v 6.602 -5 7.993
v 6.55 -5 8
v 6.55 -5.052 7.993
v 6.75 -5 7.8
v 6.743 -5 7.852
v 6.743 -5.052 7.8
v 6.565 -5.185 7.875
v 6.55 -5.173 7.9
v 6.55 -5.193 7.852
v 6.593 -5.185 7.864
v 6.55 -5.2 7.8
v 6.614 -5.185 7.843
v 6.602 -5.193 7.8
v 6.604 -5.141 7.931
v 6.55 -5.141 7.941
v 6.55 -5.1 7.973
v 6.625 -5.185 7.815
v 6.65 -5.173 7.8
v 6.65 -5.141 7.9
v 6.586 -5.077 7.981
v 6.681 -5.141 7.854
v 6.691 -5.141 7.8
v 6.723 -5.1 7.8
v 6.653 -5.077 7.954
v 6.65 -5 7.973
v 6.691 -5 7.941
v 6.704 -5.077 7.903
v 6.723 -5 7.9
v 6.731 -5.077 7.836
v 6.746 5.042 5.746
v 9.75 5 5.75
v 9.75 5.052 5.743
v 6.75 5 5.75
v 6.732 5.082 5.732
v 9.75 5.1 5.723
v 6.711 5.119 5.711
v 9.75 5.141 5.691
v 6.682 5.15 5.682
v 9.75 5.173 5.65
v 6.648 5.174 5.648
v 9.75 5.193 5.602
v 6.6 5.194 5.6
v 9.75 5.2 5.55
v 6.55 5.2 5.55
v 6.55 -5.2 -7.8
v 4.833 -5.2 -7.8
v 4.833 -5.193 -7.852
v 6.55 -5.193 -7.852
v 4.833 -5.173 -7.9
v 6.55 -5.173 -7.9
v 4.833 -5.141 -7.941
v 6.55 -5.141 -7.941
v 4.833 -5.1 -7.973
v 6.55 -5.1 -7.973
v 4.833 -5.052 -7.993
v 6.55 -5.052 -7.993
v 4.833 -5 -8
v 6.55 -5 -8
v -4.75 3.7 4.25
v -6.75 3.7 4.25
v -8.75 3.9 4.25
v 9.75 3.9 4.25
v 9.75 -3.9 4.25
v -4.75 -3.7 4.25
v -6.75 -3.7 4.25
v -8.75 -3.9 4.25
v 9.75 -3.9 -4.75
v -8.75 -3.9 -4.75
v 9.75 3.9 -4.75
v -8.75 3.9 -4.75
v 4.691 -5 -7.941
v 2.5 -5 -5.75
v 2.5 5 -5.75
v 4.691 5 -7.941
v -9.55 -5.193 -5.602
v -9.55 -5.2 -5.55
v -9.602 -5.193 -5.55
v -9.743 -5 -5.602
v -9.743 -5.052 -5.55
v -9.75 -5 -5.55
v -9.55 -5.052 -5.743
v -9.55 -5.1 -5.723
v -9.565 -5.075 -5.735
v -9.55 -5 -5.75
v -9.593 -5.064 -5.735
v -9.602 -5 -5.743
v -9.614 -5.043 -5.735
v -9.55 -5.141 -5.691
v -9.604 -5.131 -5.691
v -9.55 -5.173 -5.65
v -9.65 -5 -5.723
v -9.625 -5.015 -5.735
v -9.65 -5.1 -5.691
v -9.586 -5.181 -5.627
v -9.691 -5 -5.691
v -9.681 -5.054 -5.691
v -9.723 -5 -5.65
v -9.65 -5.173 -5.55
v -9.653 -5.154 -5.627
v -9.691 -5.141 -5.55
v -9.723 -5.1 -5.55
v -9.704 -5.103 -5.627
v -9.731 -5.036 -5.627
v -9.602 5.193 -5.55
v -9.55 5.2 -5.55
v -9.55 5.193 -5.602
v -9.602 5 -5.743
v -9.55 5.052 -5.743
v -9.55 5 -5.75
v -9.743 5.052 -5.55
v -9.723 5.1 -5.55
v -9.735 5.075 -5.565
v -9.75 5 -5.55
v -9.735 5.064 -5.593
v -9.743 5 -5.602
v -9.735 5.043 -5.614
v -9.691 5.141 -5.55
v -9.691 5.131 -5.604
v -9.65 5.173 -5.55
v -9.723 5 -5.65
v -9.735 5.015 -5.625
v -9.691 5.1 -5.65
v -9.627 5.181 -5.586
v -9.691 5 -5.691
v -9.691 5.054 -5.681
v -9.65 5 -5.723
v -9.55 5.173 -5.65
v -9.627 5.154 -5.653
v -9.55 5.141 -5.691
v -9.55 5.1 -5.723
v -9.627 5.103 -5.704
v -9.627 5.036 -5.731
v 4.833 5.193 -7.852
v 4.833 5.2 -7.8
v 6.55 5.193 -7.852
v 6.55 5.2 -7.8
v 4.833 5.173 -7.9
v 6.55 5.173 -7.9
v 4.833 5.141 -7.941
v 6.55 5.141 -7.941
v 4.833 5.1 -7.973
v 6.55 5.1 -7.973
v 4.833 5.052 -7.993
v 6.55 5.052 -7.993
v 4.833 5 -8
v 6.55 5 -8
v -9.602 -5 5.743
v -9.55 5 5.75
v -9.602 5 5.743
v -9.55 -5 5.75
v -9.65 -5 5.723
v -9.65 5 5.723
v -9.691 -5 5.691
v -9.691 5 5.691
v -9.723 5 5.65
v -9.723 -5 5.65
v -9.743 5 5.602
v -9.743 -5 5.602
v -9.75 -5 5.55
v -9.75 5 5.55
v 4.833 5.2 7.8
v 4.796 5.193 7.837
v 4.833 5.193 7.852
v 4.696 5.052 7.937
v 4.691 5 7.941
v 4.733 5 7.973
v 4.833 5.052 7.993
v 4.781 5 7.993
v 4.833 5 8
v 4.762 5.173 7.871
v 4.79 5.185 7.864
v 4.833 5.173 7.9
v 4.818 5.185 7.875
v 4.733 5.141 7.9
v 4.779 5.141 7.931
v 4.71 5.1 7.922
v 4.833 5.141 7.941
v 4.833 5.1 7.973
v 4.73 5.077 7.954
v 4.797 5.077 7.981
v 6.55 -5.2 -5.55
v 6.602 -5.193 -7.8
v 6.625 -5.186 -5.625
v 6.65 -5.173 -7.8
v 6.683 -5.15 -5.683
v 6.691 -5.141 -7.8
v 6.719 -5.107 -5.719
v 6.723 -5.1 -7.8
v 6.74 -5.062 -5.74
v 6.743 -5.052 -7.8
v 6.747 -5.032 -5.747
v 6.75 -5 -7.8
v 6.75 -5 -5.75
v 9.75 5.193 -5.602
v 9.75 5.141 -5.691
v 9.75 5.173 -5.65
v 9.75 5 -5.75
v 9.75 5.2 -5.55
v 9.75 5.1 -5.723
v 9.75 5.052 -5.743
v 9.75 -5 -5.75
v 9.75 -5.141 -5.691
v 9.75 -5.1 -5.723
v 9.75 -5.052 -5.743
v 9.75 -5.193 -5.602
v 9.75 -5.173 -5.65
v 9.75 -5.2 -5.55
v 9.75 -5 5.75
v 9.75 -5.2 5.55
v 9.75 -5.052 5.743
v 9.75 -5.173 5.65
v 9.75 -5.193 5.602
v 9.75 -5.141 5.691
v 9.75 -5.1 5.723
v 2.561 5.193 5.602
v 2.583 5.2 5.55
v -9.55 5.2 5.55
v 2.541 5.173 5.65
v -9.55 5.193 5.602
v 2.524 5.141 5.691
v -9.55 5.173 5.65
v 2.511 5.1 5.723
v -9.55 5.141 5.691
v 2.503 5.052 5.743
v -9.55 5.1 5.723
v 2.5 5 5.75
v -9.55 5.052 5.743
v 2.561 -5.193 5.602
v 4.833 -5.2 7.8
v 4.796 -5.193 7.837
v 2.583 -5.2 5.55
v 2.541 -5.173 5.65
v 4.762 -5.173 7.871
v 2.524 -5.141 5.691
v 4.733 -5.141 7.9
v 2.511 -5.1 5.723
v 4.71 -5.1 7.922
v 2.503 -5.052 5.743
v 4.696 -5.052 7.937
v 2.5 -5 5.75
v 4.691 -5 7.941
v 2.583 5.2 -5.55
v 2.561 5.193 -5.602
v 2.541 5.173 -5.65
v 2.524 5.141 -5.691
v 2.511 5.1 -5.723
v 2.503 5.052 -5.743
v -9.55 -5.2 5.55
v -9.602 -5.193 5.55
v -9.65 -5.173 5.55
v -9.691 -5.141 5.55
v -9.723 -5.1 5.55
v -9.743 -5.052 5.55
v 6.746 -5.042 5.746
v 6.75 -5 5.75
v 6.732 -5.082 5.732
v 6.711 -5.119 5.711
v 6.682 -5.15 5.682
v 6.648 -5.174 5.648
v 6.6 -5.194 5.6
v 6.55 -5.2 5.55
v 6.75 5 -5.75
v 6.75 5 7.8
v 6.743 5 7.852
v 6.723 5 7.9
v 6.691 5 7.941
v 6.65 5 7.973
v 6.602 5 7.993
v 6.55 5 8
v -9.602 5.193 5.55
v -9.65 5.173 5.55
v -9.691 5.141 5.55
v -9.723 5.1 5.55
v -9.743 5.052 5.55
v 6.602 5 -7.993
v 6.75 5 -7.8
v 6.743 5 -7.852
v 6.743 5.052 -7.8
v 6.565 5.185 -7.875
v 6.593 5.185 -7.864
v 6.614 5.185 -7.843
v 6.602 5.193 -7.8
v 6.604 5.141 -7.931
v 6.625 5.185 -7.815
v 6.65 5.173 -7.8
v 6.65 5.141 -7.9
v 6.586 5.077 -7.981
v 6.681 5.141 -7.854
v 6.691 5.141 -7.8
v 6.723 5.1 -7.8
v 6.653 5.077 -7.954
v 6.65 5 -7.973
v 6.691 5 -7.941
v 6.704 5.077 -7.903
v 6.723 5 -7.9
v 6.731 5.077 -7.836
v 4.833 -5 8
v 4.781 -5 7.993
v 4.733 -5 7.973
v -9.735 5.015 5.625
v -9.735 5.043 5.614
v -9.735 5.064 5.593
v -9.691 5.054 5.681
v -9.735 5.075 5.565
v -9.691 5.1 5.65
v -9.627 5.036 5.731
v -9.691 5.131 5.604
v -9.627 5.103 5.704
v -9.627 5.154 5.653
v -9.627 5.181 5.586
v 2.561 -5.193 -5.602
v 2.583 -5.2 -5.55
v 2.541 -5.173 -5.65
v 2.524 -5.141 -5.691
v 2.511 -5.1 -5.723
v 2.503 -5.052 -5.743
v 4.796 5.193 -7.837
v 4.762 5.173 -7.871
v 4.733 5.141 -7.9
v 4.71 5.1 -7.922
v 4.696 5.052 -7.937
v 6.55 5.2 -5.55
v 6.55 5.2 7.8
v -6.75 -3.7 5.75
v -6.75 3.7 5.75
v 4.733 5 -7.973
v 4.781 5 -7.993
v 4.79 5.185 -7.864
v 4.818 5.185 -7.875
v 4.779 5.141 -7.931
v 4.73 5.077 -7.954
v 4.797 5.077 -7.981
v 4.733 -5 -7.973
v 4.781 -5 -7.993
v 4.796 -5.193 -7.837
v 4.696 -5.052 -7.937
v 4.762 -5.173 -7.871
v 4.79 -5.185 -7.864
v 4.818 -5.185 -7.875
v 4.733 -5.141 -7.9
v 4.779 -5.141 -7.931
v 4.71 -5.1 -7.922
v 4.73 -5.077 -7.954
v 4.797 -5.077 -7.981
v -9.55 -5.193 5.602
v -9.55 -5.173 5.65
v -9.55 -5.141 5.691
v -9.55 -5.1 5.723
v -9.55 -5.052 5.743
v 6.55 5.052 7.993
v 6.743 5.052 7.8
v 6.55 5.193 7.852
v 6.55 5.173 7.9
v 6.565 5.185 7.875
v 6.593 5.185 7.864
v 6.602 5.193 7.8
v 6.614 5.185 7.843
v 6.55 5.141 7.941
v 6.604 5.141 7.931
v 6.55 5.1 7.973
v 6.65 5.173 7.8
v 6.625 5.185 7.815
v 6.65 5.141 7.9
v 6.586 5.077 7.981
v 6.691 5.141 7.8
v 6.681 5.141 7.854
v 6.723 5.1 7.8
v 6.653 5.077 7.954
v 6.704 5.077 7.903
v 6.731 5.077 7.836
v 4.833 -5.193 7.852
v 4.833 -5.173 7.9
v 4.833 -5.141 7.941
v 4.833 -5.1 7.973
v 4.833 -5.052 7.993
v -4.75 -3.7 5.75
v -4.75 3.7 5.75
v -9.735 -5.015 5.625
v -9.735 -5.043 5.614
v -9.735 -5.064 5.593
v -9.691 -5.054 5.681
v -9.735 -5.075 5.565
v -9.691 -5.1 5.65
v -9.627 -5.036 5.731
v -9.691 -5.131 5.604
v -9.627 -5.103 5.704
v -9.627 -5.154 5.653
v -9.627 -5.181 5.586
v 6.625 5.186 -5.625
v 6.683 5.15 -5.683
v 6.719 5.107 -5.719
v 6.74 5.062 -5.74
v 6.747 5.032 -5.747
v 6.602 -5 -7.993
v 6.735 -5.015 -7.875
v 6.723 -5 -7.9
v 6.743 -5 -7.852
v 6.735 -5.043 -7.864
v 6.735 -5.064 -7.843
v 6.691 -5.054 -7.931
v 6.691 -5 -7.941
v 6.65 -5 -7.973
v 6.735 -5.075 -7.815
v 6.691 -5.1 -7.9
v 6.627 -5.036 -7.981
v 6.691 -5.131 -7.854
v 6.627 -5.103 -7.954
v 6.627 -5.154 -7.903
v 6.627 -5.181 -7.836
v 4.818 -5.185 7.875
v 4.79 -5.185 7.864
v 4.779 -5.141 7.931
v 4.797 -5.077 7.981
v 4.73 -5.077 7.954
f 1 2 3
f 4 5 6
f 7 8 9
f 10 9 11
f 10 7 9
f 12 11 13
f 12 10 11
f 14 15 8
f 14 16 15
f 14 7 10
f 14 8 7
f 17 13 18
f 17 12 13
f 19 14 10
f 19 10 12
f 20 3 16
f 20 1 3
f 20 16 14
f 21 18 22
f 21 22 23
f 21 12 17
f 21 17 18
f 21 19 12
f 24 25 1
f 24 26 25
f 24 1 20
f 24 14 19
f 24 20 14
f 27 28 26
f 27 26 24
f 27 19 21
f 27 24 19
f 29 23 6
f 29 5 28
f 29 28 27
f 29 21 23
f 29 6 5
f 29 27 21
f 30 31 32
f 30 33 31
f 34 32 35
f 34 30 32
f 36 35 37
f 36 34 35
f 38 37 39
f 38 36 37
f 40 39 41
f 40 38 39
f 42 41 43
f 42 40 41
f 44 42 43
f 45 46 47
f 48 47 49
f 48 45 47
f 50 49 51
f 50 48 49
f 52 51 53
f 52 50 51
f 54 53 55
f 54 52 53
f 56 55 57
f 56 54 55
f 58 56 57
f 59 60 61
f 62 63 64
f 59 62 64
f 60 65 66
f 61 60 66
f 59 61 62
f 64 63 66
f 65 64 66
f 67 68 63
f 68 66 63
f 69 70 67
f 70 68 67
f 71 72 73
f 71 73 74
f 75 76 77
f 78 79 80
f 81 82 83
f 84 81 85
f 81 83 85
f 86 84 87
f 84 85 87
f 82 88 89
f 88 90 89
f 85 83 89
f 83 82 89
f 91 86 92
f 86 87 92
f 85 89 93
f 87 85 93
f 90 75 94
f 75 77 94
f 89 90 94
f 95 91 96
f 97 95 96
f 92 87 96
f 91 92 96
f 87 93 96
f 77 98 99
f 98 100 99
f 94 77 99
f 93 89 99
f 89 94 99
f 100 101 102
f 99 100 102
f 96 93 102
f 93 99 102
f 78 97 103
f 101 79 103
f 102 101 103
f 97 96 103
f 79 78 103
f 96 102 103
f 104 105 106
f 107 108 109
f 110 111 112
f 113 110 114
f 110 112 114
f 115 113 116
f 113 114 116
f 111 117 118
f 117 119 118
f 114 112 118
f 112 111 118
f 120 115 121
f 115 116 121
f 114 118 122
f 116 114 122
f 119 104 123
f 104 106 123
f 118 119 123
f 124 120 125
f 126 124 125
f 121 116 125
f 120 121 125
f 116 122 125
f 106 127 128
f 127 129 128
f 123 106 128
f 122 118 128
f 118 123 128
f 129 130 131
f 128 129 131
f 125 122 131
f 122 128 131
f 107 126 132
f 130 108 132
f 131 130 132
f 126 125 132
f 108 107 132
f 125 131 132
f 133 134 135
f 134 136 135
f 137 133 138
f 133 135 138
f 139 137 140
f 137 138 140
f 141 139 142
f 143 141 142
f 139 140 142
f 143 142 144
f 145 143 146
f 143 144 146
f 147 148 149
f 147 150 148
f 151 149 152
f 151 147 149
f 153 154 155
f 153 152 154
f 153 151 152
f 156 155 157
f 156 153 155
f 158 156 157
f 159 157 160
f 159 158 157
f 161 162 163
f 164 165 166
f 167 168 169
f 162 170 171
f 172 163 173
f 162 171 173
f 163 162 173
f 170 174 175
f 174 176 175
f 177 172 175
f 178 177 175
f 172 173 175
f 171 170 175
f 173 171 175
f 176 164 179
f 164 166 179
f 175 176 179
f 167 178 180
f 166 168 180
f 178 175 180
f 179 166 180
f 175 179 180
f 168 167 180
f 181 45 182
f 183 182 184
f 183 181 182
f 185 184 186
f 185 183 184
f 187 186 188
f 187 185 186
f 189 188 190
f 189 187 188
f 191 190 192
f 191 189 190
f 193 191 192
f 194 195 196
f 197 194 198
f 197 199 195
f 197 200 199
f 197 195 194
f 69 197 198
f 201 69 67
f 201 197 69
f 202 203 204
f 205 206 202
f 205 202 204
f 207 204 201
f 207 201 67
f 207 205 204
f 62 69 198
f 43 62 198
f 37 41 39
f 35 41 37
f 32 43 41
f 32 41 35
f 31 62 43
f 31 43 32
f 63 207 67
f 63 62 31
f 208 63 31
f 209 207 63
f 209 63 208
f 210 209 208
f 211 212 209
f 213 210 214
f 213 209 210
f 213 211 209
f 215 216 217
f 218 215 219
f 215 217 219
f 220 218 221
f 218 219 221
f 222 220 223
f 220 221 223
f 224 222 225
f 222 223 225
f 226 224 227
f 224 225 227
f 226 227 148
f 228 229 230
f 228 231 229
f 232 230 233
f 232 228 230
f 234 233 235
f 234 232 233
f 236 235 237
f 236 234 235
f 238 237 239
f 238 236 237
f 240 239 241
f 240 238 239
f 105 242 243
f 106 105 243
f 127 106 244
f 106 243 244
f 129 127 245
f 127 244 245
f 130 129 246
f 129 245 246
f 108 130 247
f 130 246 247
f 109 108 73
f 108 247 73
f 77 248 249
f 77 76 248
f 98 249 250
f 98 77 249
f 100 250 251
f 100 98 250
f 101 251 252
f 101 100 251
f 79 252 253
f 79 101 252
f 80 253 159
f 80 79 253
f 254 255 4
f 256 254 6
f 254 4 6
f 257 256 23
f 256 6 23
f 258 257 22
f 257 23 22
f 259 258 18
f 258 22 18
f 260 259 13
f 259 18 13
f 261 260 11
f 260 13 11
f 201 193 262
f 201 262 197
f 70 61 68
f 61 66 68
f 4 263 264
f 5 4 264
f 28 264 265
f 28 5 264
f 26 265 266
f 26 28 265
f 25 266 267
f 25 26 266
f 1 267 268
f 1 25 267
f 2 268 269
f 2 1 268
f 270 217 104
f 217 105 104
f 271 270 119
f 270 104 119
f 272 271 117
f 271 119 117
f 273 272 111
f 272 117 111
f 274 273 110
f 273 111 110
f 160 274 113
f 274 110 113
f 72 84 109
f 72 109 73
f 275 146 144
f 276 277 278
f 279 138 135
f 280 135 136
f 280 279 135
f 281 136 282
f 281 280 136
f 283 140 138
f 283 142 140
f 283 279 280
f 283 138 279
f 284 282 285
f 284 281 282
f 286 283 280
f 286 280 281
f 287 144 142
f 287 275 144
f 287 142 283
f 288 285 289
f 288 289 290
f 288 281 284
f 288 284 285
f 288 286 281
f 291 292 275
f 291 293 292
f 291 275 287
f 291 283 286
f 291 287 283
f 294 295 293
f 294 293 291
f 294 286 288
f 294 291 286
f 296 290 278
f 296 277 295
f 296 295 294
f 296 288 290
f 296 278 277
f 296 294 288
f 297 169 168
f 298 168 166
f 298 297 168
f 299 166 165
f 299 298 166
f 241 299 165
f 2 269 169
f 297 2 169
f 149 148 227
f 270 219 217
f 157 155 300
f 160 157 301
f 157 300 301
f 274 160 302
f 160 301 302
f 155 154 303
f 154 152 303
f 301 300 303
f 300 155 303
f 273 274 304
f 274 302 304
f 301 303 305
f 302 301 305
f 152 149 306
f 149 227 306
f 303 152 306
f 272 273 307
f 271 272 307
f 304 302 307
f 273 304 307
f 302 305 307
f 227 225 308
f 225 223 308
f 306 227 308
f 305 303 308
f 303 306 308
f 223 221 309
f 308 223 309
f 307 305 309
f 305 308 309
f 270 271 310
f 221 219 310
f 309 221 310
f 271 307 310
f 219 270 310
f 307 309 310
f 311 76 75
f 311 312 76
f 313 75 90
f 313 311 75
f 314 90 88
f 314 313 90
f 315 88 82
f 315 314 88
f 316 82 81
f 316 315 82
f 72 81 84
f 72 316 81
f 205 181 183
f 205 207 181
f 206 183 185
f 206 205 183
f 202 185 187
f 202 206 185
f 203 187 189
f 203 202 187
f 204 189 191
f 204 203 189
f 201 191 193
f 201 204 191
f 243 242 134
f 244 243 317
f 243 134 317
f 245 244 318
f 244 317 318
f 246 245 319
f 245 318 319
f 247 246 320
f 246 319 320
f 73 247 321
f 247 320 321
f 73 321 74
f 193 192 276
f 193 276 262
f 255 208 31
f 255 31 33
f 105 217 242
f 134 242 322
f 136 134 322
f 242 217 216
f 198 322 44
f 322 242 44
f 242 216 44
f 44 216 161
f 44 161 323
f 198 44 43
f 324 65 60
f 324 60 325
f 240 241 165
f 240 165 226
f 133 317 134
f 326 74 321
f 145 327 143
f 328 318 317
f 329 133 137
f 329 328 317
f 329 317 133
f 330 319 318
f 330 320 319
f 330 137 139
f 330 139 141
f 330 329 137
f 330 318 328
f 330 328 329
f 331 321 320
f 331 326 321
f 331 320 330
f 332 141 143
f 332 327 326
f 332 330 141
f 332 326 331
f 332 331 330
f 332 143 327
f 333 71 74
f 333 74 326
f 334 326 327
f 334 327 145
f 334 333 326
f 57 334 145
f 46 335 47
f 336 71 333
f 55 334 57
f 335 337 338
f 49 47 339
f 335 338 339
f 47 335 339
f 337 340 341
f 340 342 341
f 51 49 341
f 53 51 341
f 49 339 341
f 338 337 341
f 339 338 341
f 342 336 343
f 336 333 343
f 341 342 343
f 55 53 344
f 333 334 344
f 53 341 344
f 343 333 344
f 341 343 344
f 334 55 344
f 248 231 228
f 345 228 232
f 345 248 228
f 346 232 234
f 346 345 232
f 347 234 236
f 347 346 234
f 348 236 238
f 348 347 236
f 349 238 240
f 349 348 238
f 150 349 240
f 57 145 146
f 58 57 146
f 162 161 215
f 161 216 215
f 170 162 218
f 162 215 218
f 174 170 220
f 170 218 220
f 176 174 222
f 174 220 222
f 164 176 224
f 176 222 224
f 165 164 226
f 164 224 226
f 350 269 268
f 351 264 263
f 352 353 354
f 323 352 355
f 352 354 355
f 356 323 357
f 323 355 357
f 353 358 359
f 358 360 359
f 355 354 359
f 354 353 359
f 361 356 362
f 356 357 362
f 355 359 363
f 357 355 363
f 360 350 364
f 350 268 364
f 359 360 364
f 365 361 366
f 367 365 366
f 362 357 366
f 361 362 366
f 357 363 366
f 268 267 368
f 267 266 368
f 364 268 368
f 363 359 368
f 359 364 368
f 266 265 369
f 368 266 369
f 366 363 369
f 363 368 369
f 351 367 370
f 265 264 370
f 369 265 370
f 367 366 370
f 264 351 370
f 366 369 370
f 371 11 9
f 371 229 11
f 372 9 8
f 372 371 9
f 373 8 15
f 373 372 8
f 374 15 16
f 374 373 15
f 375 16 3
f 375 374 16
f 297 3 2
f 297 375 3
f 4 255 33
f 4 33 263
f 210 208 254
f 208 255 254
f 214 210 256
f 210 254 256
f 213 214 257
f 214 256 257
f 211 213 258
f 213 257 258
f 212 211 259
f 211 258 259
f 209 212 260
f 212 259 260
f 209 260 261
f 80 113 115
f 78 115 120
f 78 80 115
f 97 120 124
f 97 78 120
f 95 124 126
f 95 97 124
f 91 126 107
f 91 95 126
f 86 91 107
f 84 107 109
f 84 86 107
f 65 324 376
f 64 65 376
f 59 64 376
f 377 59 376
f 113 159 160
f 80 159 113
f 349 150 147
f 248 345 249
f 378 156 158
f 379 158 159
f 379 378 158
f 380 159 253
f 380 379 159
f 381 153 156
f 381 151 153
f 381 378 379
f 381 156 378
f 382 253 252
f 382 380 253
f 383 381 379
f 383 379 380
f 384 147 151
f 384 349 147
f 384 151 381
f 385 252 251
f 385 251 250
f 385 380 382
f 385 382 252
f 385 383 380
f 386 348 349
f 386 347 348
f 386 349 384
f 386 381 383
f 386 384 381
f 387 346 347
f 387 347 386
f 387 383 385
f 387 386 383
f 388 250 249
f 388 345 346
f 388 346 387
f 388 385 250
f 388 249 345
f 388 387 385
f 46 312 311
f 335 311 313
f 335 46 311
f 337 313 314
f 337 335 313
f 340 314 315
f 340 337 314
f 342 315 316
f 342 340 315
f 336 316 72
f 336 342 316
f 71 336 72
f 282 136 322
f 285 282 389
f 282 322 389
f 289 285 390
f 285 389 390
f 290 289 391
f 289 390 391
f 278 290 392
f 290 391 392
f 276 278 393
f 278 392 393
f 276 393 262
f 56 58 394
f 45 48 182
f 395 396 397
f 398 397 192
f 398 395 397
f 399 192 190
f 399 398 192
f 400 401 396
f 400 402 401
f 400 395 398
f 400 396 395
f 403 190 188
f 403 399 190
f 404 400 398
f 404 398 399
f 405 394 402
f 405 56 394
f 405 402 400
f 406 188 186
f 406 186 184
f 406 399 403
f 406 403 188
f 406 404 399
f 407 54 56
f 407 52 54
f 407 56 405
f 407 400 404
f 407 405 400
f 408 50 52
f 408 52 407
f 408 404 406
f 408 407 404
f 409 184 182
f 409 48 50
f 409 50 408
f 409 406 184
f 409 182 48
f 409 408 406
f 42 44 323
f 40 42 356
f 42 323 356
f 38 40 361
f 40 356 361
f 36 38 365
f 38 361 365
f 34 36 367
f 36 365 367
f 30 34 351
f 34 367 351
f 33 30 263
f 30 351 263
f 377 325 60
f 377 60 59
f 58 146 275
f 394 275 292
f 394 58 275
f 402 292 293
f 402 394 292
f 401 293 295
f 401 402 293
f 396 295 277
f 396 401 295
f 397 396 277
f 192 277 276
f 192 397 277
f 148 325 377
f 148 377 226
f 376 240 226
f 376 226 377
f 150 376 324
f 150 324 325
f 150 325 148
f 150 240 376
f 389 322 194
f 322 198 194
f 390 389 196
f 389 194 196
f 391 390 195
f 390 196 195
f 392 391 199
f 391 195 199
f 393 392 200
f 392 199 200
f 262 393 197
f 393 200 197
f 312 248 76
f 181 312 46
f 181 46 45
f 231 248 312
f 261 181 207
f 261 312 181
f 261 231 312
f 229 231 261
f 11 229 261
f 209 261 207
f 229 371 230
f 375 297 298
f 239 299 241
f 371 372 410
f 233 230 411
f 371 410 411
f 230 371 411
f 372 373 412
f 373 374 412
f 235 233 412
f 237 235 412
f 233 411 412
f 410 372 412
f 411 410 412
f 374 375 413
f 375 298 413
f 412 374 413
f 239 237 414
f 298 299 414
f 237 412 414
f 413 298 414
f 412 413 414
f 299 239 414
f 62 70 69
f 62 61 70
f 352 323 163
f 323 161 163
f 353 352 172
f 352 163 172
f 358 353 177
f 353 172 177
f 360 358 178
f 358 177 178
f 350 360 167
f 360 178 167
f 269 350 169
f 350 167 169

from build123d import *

# Parameters (mm, degrees)
F0_W     = 2
F0_H     = 1.5
F1_DEPTH = 5.2
F2_DEPTH = 3.7
F3_DEPTH = 3.9
F4_R     = 0.2


with BuildPart() as f1:
    # F0 (on Front) → F1 (new body, symmetric)
    with BuildSketch(Plane.XZ):
        Polygon((-4.75, 4.25), (9.75, 4.25), (9.75, 5.75), (6.75, 5.75), (2.5, 5.75), (-4.75, 5.75), align=None)
        Polygon((2.5, 5.75), (6.75, 5.75), (6.75, 8), (4.75, 8), align=None)
        Polygon((6.75, -5.75), (9.75, -5.75), (9.75, -4.75), (-8.75, -4.75), (-8.75, 4.25), (-6.75, 4.25), (-6.75, 5.75), (-9.75, 5.75), (-9.75, -5.75), (2.5, -5.75), align=None)
        Polygon((6.75, -8), (6.75, -5.75), (2.5, -5.75), (4.75, -8), align=None)
        Polygon((-8.75, -4.75), (9.75, -4.75), (9.75, 4.25), (-4.75, 4.25), (-6.75, 4.25), (-8.75, 4.25), align=None)
        with Locations((-5.75, 5)):
            Rectangle(F0_W, F0_H)
    extrude(amount=F1_DEPTH, both=True)

    # F0 (on Front) → F2 (cut, symmetric)
    with BuildSketch(Plane.XZ):
        with Locations((-5.75, 5)):
            Rectangle(F0_W, F0_H)
    extrude(amount=F2_DEPTH, both=True, mode=Mode.SUBTRACT)

    # F0 (on Front) → F3 (cut, symmetric)
    with BuildSketch(Plane.XZ):
        Polygon((-8.75, -4.75), (9.75, -4.75), (9.75, 4.25), (-4.75, 4.25), (-6.75, 4.25), (-8.75, 4.25), align=None)
    extrude(amount=F3_DEPTH, both=True, mode=Mode.SUBTRACT)

    # F4
    f4_edges = [f1.edges().sort_by_distance(p)[0] for p in [
        (-3.625, -5.2, 5.75),
        (3.625, -5.2, 6.875),
        (6.75, 0, 8),
        (4.75, 0, 8),
        (5.75, -5.2, 8),
        (6.75, -5.2, 6.875),
        (8.25, -5.2, 5.75),
        (8.25, 5.2, 5.75),
        (-3.625, 5.2, 5.75),
        (3.625, 5.2, 6.875),
        (5.75, 5.2, 8),
        (-9.75, 0, 5.75),
        (-9.75, -5.2, 0),
        (-3.625, -5.2, -5.75),
        (5.75, -5.2, -8),
        (8.25, -5.2, -5.75),
        (6.75, 0, -8),
        (4.75, 0, -8),
        (3.625, 5.2, -6.875),
        (3.625, -5.2, -6.875),
        (5.75, 5.2, -8),
        (-3.625, 5.2, -5.75),
        (8.25, 5.2, -5.75),
        (6.75, 5.2, -6.875),
        (-9.75, 5.2, 0),
        (-9.75, 0, -5.75),
        (6.75, 5.2, 6.875),
        (6.75, -5.2, -6.875),
    ]]
    fillet(f4_edges, radius=F4_R)


solid = f1.part
